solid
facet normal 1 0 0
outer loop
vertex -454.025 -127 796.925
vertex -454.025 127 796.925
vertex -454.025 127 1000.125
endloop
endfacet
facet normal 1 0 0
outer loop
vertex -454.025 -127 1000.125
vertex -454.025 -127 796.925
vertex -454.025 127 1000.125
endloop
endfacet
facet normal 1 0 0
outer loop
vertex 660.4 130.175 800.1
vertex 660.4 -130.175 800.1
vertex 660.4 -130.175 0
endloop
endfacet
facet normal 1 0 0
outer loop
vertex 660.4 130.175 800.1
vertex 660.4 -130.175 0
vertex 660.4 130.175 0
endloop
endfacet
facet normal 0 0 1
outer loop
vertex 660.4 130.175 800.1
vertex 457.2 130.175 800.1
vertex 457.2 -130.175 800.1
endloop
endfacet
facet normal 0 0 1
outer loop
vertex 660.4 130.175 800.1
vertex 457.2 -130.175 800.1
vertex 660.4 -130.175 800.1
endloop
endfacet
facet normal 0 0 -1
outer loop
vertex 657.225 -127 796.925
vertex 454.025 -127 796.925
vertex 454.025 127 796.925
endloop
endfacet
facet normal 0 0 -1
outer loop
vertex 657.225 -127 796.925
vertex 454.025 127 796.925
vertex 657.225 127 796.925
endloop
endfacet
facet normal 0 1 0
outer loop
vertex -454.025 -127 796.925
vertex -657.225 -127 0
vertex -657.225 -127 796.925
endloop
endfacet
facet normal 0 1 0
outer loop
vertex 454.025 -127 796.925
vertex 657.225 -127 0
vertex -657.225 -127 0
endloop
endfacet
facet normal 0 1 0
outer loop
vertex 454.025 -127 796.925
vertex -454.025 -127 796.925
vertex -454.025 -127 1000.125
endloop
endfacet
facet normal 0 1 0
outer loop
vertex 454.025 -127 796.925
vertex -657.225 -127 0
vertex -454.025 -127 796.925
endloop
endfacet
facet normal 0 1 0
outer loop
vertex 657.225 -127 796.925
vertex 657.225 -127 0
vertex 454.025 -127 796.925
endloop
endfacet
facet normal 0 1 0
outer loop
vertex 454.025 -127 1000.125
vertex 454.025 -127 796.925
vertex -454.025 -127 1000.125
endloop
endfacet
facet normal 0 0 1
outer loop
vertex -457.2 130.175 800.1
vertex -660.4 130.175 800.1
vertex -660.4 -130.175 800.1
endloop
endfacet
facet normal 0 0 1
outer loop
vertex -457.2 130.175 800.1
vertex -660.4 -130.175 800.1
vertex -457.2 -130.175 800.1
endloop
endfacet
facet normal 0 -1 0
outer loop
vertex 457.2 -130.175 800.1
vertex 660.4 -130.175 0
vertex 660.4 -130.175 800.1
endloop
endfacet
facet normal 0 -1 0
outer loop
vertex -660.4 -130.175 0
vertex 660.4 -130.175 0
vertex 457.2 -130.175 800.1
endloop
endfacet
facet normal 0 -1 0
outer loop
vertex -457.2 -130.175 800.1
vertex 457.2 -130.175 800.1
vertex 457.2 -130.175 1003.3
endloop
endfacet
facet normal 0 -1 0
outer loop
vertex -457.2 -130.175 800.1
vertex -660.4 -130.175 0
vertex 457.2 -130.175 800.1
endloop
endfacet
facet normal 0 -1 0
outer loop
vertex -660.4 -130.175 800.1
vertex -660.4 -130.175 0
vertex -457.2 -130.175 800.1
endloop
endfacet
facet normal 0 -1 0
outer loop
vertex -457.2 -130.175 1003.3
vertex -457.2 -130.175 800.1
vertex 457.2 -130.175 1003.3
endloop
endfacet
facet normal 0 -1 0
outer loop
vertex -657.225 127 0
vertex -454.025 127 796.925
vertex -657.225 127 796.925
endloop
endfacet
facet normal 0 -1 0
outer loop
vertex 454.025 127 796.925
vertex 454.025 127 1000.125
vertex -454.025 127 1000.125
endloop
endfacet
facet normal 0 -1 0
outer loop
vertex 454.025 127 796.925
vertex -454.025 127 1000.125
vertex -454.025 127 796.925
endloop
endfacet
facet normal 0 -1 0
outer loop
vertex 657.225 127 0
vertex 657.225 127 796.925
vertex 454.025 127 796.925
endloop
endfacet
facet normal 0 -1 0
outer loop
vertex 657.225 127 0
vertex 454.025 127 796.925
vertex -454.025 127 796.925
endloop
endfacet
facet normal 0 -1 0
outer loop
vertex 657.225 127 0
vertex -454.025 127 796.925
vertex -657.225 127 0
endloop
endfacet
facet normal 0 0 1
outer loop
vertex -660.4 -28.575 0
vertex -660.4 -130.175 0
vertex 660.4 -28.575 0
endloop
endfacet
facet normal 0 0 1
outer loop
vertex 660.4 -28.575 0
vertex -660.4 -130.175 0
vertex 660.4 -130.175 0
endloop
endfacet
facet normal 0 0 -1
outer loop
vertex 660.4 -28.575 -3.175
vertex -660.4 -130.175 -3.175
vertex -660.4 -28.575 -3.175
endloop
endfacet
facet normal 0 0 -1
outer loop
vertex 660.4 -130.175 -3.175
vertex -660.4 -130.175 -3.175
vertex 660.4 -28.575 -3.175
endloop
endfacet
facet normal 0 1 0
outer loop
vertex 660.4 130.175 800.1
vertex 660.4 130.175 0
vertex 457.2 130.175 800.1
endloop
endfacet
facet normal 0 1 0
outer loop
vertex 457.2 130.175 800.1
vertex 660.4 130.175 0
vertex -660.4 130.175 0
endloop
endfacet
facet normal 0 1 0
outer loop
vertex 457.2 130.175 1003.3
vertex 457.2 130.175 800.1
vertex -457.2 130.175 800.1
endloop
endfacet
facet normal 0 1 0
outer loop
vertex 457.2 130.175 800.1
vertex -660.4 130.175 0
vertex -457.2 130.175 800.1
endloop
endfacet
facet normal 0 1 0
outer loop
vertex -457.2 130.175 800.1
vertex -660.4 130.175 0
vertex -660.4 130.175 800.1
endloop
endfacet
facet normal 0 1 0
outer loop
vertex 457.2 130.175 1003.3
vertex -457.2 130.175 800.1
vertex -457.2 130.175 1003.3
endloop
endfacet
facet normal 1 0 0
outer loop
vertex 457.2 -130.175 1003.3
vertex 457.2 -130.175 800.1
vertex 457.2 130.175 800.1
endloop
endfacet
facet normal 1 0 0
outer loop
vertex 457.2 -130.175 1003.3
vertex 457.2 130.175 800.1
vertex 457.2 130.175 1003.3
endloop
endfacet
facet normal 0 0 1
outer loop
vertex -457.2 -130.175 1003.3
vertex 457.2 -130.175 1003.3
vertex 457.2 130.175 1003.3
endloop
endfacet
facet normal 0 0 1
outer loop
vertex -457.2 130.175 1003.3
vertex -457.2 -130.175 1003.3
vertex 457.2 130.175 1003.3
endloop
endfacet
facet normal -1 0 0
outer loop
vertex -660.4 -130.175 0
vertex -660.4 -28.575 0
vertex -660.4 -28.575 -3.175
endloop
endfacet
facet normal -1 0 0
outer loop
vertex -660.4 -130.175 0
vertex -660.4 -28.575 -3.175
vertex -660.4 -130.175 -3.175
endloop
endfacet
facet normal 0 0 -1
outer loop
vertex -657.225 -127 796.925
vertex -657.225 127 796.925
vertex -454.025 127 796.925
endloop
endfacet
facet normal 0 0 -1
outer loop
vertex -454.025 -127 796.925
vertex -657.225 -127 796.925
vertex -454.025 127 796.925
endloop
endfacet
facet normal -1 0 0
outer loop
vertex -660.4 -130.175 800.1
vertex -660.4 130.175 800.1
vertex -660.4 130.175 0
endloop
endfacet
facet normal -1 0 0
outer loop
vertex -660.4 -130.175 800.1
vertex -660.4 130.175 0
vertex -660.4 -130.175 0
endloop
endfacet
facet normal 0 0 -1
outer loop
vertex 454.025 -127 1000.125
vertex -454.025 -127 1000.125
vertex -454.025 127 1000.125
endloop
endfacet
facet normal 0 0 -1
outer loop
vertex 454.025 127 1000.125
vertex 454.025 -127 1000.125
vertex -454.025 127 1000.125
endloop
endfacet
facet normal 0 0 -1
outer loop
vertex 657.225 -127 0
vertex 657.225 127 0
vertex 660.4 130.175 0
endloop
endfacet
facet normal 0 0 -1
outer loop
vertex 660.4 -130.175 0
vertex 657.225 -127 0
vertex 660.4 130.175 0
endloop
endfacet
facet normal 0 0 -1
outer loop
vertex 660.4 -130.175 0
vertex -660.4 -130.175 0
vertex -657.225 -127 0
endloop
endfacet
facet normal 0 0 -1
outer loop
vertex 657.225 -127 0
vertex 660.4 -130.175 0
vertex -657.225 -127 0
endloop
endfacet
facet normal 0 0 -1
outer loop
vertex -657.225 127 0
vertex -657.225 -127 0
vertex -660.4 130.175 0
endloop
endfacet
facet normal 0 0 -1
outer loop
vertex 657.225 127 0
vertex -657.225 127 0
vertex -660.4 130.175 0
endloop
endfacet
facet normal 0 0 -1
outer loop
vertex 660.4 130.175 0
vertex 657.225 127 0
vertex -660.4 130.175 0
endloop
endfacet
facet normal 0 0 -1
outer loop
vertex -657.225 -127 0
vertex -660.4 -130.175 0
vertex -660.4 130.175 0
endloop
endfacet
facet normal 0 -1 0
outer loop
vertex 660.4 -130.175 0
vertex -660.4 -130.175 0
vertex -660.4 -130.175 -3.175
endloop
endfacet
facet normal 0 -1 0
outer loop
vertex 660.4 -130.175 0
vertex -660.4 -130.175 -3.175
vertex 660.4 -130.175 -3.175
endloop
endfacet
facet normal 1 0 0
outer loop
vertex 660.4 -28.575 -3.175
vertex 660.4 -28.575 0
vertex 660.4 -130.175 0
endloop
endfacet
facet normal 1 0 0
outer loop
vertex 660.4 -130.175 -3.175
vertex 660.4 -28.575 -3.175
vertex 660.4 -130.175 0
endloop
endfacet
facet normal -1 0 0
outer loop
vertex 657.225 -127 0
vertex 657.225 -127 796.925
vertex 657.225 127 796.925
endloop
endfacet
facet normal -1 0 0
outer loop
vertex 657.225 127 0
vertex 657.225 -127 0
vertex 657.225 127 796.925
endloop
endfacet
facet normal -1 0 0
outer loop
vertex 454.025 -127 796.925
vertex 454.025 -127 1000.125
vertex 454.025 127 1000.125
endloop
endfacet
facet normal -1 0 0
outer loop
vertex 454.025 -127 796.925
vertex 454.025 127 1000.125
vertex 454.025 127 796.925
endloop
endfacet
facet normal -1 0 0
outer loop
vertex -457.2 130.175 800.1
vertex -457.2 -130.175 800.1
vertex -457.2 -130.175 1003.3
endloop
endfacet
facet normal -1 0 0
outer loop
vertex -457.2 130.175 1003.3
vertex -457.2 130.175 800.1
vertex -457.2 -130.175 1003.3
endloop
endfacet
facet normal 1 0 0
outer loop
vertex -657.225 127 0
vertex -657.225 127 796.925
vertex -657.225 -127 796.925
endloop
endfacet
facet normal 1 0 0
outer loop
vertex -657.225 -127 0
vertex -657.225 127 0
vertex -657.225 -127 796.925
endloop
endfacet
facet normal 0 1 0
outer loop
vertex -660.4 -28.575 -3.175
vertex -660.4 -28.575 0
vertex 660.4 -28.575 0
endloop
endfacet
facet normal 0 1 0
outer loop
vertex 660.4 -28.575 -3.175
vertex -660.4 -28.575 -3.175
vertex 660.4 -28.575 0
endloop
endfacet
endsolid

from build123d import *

# Parameters (mm, degrees)
F1_DEPTH  = 657.225
F2_W      = 254
F2_H      = 1000.125
F3_DEPTH  = 3.175
F4_W      = 260.35
F4_H      = 1003.3
F5_DEPTH  = 3.175
F6_W      = 1320.8
F6_H      = 101.6
F7_DEPTH  = 3.175
F8_W      = 277.2880700111
F8_H      = 246.1290188886
F8_W_2    = 389.8101107368
F9_DEPTH  = 260.351
F10_W     = 3.175
F10_H     = 203.2
F10_H_2   = 3.175
F11_DEPTH = 260.35


with BuildPart() as f1:
    # F0 (on Right) → F1 (new body, symmetric)
    with BuildSketch(Plane.YZ):
        Polygon((127, 1000.125), (127, 0), (130.175, 0), (130.175, 1003.3), (-130.175, 1003.3), (-130.175, 0), (-127, 0), (-127, 1000.125), align=None)
    extrude(amount=F1_DEPTH, both=True)

    # F2 (on face) → F3 (join)
    with BuildSketch(Plane(origin=(-657.225, 0, 0), x_dir=(0, -1, 0), z_dir=(-1, 0, 0))):
        with Locations((0, 500.0625)):
            Rectangle(F2_W, F2_H)
        Polygon((130.175, 1003.3), (-130.175, 1003.3), (-130.175, 0), (-127, 0), (-127, 1000.125), (127, 1000.125), (127, 0), (130.175, 0), align=None)
    extrude(amount=F3_DEPTH)

    # F4 (on face) → F5 (join)
    with BuildSketch(Plane.YZ.offset(657.225)):
        with Locations((0, 501.65)):
            Rectangle(F4_W, F4_H)
    extrude(amount=F5_DEPTH)

    # F8 (on face) → F9 (cut, through all)
    with BuildSketch(Plane.XZ.offset(130.175)):
        with Locations((-595.8440350056, 923.1645094443)):
            Rectangle(F8_W, F8_H)
        with Locations((652.1050553684, 923.1645094443)):
            Rectangle(F8_W_2, F8_H)
    extrude(amount=-F9_DEPTH, mode=Mode.SUBTRACT)

    # F10 (on face) → F11 (join, through all)
    with BuildSketch(Plane.XZ.offset(130.175)):
        Polygon((-457.2, 800.1), (-660.4, 800.1), (-660.4, 796.925), (-454.025, 796.925), (-454.025, 800.1), align=None)
        with Locations((-455.6125, 901.7)):
            Rectangle(F10_W, F10_H)
        with Locations((455.6125, 901.7)):
            Rectangle(F10_W, F10_H)
        Polygon((657.225, 800.1), (457.2, 800.1), (457.2, 796.925), (660.4, 796.925), (660.4, 800.1), align=None)
        with Locations((455.6125, 798.5125)):
            Rectangle(F10_W, F10_H_2)
    extrude(amount=-F11_DEPTH)


with BuildPart() as f7:
    # F6 (on face) → F7 (new body)
    with BuildSketch(Plane(origin=(0, 0, 0), x_dir=(1, 0, 0), z_dir=(0, 0, -1))):
        with Locations((0, 79.375)):
            Rectangle(F6_W, F6_H)
    extrude(amount=F7_DEPTH)


solid = Compound([f1.part, f7.part])
